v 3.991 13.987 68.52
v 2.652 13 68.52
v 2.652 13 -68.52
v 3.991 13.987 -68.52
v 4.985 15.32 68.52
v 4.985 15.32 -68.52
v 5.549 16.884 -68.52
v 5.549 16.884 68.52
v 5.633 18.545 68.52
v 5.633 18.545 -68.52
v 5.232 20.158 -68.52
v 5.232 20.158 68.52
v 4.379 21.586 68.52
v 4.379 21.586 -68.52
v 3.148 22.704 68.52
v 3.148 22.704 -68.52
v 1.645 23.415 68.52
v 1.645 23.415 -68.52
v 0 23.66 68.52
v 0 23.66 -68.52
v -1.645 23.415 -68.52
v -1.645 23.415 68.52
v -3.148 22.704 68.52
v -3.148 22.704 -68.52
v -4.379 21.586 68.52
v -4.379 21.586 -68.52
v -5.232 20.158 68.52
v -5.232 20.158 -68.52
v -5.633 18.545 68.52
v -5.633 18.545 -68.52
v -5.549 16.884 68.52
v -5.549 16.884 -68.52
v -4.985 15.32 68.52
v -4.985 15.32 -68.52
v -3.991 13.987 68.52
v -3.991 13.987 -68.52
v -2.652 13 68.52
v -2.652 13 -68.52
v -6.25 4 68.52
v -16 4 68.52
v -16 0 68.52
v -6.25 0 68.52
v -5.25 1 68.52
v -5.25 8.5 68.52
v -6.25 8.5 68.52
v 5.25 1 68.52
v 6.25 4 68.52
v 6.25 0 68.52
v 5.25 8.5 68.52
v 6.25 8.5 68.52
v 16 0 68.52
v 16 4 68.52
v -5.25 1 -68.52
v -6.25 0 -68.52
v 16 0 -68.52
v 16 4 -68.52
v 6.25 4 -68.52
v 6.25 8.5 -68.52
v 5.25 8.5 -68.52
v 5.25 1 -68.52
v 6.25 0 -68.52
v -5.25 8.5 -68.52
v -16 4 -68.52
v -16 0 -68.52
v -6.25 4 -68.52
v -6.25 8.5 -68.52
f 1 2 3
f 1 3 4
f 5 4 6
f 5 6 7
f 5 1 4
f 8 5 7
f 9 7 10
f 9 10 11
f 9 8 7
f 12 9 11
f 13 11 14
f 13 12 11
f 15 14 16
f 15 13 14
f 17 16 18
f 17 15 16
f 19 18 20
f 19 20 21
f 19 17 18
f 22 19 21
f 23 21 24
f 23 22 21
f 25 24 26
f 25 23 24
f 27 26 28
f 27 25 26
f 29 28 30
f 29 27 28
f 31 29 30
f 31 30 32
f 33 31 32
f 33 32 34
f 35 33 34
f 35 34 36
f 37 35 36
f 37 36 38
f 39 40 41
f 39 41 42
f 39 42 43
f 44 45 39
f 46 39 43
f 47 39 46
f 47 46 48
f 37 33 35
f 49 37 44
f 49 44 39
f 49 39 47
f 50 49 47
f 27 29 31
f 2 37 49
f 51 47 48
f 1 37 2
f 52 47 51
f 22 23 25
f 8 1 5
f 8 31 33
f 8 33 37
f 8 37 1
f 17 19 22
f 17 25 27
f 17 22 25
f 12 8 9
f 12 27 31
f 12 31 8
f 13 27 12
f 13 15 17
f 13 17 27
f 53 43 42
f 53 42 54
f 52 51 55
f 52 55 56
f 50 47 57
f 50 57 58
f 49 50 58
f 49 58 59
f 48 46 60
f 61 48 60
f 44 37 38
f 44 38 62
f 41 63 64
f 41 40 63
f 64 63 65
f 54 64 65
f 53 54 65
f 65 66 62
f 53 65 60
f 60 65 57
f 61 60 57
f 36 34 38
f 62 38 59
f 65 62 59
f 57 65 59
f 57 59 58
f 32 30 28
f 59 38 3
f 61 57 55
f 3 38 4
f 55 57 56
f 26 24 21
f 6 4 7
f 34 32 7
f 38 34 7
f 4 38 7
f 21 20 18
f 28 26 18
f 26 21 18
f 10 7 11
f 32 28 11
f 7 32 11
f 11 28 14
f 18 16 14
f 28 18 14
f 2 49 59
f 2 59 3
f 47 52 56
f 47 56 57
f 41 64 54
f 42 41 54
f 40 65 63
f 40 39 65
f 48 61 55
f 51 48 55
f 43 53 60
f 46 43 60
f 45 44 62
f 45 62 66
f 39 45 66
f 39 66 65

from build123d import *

# Parameters (mm, degrees)
EXTRUDE_1_DEPTH     = 68.52
SKETCH_2_W          = 10.5
SKETCH_2_H          = 1
CUT_EXTRUDE_1_DEPTH = 140.984803019
CHAMFER_1_SIZE      = 1


with BuildPart() as part:
    # 草图1 → 凸台-拉伸1 (new, symmetric)
    with BuildSketch(Plane.XY):
        with BuildLine():
            Line((-16, 0), (16, 0))
            Line((16, 0), (16, 4))
            Line((16, 4), (6.25, 4))
            Line((6.25, 4), (6.25, 8.5))
            Line((6.25, 8.5), (5.25, 8.5))
            Line((5.25, 8.5), (2.651923789, 13))
            ThreePointArc((2.651923789, 13), (0, 23.659743791), (-2.651923789, 13))
            Line((-2.651923789, 13), (-5.25, 8.5))
            Line((-5.25, 8.5), (-6.25, 8.5))
            Line((-6.25, 8.5), (-6.25, 4))
            Line((-6.25, 4), (-16, 4))
            Line((-16, 4), (-16, 0))
        make_face()
    extrude(amount=EXTRUDE_1_DEPTH, both=True)

    # 草图2 → 切除-拉伸1 (cut, through all)
    with BuildSketch(Plane.XY.offset(68.52)):
        with Locations((0, 0.5)):
            Rectangle(SKETCH_2_W, SKETCH_2_H)
    extrude(amount=-CUT_EXTRUDE_1_DEPTH, mode=Mode.SUBTRACT)

    # 倒角1
    chamfer_1_edges = [part.edges().sort_by_distance(p)[0] for p in [
        (5.25, 0, 0),
        (-5.25, 0, 0),
    ]]
    chamfer(chamfer_1_edges, length=CHAMFER_1_SIZE - 0.0001)  # a hair under: the kernel refuses the full size


solid = part.part
